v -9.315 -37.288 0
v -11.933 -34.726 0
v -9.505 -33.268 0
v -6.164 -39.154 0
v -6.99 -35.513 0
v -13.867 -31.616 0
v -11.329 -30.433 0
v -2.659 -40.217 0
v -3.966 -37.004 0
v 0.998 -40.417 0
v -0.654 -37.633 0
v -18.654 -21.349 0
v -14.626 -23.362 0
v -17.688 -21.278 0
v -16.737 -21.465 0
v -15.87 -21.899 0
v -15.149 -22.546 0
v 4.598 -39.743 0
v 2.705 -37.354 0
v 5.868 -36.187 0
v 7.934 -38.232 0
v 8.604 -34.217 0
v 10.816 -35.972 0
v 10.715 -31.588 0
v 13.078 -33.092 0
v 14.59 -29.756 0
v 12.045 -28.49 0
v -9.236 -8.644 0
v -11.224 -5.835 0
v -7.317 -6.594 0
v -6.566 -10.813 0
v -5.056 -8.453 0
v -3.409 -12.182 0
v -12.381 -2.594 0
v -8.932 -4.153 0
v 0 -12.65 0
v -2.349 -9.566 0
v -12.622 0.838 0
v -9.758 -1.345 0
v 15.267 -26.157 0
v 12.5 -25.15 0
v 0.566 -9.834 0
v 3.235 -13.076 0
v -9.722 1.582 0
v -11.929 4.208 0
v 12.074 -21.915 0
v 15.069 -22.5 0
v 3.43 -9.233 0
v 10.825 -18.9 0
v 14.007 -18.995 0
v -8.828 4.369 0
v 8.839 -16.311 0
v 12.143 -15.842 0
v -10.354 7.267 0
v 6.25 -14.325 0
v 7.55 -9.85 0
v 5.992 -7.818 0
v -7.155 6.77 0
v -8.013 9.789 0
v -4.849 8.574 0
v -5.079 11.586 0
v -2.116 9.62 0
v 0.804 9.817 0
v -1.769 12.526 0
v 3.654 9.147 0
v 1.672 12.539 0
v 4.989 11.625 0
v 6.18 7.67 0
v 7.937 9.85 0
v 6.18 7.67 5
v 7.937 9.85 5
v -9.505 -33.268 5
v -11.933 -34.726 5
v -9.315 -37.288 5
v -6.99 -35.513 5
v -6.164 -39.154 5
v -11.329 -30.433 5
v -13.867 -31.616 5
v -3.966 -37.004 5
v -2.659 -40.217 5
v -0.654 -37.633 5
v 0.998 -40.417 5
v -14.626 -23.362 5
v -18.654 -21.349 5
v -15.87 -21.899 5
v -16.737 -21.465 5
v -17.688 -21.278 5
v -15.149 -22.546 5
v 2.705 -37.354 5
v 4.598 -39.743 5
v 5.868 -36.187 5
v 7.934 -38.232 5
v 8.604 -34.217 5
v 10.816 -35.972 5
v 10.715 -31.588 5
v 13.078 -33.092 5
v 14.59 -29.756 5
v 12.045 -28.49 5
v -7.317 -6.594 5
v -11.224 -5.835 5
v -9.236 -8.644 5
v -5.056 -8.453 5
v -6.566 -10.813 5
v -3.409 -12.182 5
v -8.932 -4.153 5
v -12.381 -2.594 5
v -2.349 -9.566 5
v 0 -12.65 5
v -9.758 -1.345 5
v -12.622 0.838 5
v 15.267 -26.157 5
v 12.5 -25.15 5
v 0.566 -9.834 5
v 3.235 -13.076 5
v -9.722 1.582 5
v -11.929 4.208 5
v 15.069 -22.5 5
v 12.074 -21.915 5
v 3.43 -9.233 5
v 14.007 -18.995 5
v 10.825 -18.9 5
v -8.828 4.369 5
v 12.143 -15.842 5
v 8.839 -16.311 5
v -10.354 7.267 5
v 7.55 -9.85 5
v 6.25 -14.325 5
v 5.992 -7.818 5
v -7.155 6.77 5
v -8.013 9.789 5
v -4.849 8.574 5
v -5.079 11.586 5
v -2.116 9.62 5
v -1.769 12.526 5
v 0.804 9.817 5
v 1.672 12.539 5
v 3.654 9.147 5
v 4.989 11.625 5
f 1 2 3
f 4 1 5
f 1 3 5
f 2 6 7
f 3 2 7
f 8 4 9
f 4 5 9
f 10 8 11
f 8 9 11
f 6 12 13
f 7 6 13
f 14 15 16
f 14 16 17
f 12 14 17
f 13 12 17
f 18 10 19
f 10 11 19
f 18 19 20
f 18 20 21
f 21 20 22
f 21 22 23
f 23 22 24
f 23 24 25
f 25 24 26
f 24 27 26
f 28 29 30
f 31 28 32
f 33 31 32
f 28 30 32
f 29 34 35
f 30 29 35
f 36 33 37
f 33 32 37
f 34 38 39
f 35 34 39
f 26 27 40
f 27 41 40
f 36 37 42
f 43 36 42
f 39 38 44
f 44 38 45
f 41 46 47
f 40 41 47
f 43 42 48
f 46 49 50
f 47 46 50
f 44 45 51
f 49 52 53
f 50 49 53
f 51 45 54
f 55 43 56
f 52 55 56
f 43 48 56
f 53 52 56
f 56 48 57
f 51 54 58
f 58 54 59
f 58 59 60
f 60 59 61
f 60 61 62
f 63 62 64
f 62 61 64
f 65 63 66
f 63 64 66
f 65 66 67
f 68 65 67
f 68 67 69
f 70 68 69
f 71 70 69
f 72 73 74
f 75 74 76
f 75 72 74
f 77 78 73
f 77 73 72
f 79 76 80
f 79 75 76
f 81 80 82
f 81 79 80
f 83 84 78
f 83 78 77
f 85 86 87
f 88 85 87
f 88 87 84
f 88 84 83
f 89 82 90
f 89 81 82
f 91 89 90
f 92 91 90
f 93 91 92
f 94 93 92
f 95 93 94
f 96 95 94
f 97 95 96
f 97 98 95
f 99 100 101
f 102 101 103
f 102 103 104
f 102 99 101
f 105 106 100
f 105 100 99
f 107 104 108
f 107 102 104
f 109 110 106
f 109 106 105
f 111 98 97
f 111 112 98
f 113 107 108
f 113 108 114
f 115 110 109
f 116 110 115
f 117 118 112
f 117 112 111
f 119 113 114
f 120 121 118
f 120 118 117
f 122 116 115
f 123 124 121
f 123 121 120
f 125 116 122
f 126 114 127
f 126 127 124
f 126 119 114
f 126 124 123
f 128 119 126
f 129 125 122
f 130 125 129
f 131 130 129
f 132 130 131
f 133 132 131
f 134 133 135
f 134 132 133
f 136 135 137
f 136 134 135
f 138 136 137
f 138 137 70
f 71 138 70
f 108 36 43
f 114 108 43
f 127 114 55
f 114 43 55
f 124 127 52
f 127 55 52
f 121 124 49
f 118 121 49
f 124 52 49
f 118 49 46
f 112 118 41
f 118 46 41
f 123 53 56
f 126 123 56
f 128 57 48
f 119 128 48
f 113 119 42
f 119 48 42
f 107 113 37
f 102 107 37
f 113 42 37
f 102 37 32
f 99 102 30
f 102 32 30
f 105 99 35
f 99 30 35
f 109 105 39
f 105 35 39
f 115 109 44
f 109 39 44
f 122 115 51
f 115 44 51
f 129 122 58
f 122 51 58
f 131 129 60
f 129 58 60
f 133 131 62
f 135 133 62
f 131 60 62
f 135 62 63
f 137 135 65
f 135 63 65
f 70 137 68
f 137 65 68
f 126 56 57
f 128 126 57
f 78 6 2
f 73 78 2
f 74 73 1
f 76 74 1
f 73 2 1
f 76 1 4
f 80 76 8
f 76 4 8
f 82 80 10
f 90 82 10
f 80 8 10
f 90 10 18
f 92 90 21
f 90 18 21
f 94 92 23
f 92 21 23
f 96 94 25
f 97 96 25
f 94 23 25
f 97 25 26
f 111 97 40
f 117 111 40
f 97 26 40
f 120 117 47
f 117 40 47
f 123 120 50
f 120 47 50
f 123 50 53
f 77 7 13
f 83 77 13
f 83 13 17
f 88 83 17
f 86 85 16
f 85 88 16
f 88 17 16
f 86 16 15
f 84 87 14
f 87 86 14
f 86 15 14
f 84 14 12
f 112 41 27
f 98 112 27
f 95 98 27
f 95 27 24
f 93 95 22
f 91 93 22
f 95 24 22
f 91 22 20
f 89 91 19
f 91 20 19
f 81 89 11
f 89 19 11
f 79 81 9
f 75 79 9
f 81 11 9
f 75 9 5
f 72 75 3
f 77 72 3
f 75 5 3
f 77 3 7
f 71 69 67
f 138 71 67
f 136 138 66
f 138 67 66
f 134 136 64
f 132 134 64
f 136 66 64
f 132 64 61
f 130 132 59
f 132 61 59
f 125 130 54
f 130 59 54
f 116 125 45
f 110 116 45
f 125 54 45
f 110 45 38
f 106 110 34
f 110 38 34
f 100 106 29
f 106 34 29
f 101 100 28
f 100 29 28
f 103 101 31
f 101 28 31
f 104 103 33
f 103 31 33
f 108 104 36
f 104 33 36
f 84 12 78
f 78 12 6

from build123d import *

# Parameters (mm, degrees)
F1_DEPTH    = 5
F2_T1_DEPTH = 22.6347624906


# Not quite as in the source:
# - a fillet or chamfer that OpenCascade refuses, or shapes differently, is made with other operations: its cross-section is extruded or revolved along the edge and cut away or added


with BuildPart() as f1:
    # F0 (on Top) → F1 (new body)
    with BuildSketch(Plane.XY):
        with BuildLine():
            ThreePointArc((5.9922465209, -7.8176391342), (-9.8492732487, 0.1196514659), (6.1803914025, 7.6697628458))
            Line((6.1803914025, 7.6697628458), (7.9372539332, 9.85))
            ThreePointArc((7.9372539332, 9.85), (-11.9294802904, 4.2083250825), (0, -12.65))
            ThreePointArc((0, -12.65), (8.8388347648, -16.3111652352), (12.5, -25.15))
            ThreePointArc((12.5, -25.15), (2.7054951742, -37.353700089), (-11.328847338, -30.4327282718))
            Line((-11.328847338, -30.4327282718), (-16.1166251075, -20.1653057112))
            Line((-16.1166251075, -20.1653057112), (-18.6542869112, -21.3486368441))
            Line((-18.6542869112, -21.3486368441), (-13.8665091417, -31.6160594046))
            ThreePointArc((-13.8665091417, -31.6160594046), (7.9338387883, -38.2322093731), (12.1431348989, -15.8422465209))
            Line((12.1431348989, -15.8422465209), (7.5500579161, -9.85))
            Line((7.5500579161, -9.85), (5.9922465209, -7.8176391342))
        make_face()
    extrude(amount=F1_DEPTH)

    # F2: fillet of radius 3.6213203436 on 1 edges, made by hand

    # F2_s2 → F2_t1 (cut)
    with BuildSketch(Plane.XY.offset(-8.8173812453)):
        with BuildLine():
            ThreePointArc((-14.6260705735, -23.3618102248), (-16.289199108, -21.6529383212), (-18.6542869112, -21.3486368441))
            Line((-18.6542869112, -21.3486368441), (-16.1166251075, -20.1653057112))
            Line((-16.1166251075, -20.1653057112), (-14.6260705735, -23.3618102248))
        make_face()
    extrude(amount=F2_T1_DEPTH, mode=Mode.SUBTRACT)


solid = f1.part
